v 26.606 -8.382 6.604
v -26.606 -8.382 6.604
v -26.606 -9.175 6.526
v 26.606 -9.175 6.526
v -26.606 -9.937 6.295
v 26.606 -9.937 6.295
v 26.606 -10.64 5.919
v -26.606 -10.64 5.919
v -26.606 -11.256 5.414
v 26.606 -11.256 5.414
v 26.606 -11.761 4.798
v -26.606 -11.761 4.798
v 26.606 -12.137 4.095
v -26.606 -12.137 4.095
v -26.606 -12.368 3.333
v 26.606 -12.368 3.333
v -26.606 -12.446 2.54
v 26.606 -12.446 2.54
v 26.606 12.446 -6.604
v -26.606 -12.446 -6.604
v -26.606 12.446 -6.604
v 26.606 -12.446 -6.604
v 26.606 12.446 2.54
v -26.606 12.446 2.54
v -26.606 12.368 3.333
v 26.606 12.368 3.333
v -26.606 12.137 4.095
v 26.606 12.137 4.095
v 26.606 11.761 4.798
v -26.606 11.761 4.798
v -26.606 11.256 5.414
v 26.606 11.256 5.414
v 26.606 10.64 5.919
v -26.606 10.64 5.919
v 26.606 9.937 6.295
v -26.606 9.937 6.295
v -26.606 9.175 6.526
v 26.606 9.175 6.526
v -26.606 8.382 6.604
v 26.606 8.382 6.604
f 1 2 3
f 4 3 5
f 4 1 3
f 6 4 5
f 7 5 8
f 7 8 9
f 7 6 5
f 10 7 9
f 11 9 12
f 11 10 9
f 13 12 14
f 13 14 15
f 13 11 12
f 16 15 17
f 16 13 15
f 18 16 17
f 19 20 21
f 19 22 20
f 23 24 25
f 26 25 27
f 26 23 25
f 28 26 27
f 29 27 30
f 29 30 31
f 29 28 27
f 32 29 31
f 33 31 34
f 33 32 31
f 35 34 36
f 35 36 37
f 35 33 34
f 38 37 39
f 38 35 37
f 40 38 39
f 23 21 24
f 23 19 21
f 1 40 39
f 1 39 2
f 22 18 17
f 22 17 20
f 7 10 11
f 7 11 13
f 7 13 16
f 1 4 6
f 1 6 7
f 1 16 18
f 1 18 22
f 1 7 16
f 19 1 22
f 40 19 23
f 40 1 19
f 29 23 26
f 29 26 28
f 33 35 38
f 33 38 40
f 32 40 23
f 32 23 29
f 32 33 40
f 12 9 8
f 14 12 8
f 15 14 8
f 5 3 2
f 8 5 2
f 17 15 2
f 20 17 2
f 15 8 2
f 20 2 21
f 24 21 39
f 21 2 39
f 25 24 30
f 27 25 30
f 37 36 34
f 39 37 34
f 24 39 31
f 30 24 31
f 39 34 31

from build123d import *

# Parameters (mm, degrees)
F1_DEPTH = 26.6065


with BuildPart() as f1:
    # F0 (on Right) → F1 (new body, symmetric)
    with BuildSketch(Plane.YZ):
        with BuildLine():
            ThreePointArc((12.446, 2.54), (11.255682, 5.413682), (8.382, 6.604))
            Line((8.382, 6.604), (-8.382, 6.604))
            ThreePointArc((-8.382, 6.604), (-11.255682, 5.413682), (-12.446, 2.54))
            Line((-12.446, 2.54), (-12.446, -6.604))
            Line((-12.446, -6.604), (12.446, -6.604))
            Line((12.446, -6.604), (12.446, 2.54))
        make_face()
    extrude(amount=F1_DEPTH, both=True)


solid = f1.part
